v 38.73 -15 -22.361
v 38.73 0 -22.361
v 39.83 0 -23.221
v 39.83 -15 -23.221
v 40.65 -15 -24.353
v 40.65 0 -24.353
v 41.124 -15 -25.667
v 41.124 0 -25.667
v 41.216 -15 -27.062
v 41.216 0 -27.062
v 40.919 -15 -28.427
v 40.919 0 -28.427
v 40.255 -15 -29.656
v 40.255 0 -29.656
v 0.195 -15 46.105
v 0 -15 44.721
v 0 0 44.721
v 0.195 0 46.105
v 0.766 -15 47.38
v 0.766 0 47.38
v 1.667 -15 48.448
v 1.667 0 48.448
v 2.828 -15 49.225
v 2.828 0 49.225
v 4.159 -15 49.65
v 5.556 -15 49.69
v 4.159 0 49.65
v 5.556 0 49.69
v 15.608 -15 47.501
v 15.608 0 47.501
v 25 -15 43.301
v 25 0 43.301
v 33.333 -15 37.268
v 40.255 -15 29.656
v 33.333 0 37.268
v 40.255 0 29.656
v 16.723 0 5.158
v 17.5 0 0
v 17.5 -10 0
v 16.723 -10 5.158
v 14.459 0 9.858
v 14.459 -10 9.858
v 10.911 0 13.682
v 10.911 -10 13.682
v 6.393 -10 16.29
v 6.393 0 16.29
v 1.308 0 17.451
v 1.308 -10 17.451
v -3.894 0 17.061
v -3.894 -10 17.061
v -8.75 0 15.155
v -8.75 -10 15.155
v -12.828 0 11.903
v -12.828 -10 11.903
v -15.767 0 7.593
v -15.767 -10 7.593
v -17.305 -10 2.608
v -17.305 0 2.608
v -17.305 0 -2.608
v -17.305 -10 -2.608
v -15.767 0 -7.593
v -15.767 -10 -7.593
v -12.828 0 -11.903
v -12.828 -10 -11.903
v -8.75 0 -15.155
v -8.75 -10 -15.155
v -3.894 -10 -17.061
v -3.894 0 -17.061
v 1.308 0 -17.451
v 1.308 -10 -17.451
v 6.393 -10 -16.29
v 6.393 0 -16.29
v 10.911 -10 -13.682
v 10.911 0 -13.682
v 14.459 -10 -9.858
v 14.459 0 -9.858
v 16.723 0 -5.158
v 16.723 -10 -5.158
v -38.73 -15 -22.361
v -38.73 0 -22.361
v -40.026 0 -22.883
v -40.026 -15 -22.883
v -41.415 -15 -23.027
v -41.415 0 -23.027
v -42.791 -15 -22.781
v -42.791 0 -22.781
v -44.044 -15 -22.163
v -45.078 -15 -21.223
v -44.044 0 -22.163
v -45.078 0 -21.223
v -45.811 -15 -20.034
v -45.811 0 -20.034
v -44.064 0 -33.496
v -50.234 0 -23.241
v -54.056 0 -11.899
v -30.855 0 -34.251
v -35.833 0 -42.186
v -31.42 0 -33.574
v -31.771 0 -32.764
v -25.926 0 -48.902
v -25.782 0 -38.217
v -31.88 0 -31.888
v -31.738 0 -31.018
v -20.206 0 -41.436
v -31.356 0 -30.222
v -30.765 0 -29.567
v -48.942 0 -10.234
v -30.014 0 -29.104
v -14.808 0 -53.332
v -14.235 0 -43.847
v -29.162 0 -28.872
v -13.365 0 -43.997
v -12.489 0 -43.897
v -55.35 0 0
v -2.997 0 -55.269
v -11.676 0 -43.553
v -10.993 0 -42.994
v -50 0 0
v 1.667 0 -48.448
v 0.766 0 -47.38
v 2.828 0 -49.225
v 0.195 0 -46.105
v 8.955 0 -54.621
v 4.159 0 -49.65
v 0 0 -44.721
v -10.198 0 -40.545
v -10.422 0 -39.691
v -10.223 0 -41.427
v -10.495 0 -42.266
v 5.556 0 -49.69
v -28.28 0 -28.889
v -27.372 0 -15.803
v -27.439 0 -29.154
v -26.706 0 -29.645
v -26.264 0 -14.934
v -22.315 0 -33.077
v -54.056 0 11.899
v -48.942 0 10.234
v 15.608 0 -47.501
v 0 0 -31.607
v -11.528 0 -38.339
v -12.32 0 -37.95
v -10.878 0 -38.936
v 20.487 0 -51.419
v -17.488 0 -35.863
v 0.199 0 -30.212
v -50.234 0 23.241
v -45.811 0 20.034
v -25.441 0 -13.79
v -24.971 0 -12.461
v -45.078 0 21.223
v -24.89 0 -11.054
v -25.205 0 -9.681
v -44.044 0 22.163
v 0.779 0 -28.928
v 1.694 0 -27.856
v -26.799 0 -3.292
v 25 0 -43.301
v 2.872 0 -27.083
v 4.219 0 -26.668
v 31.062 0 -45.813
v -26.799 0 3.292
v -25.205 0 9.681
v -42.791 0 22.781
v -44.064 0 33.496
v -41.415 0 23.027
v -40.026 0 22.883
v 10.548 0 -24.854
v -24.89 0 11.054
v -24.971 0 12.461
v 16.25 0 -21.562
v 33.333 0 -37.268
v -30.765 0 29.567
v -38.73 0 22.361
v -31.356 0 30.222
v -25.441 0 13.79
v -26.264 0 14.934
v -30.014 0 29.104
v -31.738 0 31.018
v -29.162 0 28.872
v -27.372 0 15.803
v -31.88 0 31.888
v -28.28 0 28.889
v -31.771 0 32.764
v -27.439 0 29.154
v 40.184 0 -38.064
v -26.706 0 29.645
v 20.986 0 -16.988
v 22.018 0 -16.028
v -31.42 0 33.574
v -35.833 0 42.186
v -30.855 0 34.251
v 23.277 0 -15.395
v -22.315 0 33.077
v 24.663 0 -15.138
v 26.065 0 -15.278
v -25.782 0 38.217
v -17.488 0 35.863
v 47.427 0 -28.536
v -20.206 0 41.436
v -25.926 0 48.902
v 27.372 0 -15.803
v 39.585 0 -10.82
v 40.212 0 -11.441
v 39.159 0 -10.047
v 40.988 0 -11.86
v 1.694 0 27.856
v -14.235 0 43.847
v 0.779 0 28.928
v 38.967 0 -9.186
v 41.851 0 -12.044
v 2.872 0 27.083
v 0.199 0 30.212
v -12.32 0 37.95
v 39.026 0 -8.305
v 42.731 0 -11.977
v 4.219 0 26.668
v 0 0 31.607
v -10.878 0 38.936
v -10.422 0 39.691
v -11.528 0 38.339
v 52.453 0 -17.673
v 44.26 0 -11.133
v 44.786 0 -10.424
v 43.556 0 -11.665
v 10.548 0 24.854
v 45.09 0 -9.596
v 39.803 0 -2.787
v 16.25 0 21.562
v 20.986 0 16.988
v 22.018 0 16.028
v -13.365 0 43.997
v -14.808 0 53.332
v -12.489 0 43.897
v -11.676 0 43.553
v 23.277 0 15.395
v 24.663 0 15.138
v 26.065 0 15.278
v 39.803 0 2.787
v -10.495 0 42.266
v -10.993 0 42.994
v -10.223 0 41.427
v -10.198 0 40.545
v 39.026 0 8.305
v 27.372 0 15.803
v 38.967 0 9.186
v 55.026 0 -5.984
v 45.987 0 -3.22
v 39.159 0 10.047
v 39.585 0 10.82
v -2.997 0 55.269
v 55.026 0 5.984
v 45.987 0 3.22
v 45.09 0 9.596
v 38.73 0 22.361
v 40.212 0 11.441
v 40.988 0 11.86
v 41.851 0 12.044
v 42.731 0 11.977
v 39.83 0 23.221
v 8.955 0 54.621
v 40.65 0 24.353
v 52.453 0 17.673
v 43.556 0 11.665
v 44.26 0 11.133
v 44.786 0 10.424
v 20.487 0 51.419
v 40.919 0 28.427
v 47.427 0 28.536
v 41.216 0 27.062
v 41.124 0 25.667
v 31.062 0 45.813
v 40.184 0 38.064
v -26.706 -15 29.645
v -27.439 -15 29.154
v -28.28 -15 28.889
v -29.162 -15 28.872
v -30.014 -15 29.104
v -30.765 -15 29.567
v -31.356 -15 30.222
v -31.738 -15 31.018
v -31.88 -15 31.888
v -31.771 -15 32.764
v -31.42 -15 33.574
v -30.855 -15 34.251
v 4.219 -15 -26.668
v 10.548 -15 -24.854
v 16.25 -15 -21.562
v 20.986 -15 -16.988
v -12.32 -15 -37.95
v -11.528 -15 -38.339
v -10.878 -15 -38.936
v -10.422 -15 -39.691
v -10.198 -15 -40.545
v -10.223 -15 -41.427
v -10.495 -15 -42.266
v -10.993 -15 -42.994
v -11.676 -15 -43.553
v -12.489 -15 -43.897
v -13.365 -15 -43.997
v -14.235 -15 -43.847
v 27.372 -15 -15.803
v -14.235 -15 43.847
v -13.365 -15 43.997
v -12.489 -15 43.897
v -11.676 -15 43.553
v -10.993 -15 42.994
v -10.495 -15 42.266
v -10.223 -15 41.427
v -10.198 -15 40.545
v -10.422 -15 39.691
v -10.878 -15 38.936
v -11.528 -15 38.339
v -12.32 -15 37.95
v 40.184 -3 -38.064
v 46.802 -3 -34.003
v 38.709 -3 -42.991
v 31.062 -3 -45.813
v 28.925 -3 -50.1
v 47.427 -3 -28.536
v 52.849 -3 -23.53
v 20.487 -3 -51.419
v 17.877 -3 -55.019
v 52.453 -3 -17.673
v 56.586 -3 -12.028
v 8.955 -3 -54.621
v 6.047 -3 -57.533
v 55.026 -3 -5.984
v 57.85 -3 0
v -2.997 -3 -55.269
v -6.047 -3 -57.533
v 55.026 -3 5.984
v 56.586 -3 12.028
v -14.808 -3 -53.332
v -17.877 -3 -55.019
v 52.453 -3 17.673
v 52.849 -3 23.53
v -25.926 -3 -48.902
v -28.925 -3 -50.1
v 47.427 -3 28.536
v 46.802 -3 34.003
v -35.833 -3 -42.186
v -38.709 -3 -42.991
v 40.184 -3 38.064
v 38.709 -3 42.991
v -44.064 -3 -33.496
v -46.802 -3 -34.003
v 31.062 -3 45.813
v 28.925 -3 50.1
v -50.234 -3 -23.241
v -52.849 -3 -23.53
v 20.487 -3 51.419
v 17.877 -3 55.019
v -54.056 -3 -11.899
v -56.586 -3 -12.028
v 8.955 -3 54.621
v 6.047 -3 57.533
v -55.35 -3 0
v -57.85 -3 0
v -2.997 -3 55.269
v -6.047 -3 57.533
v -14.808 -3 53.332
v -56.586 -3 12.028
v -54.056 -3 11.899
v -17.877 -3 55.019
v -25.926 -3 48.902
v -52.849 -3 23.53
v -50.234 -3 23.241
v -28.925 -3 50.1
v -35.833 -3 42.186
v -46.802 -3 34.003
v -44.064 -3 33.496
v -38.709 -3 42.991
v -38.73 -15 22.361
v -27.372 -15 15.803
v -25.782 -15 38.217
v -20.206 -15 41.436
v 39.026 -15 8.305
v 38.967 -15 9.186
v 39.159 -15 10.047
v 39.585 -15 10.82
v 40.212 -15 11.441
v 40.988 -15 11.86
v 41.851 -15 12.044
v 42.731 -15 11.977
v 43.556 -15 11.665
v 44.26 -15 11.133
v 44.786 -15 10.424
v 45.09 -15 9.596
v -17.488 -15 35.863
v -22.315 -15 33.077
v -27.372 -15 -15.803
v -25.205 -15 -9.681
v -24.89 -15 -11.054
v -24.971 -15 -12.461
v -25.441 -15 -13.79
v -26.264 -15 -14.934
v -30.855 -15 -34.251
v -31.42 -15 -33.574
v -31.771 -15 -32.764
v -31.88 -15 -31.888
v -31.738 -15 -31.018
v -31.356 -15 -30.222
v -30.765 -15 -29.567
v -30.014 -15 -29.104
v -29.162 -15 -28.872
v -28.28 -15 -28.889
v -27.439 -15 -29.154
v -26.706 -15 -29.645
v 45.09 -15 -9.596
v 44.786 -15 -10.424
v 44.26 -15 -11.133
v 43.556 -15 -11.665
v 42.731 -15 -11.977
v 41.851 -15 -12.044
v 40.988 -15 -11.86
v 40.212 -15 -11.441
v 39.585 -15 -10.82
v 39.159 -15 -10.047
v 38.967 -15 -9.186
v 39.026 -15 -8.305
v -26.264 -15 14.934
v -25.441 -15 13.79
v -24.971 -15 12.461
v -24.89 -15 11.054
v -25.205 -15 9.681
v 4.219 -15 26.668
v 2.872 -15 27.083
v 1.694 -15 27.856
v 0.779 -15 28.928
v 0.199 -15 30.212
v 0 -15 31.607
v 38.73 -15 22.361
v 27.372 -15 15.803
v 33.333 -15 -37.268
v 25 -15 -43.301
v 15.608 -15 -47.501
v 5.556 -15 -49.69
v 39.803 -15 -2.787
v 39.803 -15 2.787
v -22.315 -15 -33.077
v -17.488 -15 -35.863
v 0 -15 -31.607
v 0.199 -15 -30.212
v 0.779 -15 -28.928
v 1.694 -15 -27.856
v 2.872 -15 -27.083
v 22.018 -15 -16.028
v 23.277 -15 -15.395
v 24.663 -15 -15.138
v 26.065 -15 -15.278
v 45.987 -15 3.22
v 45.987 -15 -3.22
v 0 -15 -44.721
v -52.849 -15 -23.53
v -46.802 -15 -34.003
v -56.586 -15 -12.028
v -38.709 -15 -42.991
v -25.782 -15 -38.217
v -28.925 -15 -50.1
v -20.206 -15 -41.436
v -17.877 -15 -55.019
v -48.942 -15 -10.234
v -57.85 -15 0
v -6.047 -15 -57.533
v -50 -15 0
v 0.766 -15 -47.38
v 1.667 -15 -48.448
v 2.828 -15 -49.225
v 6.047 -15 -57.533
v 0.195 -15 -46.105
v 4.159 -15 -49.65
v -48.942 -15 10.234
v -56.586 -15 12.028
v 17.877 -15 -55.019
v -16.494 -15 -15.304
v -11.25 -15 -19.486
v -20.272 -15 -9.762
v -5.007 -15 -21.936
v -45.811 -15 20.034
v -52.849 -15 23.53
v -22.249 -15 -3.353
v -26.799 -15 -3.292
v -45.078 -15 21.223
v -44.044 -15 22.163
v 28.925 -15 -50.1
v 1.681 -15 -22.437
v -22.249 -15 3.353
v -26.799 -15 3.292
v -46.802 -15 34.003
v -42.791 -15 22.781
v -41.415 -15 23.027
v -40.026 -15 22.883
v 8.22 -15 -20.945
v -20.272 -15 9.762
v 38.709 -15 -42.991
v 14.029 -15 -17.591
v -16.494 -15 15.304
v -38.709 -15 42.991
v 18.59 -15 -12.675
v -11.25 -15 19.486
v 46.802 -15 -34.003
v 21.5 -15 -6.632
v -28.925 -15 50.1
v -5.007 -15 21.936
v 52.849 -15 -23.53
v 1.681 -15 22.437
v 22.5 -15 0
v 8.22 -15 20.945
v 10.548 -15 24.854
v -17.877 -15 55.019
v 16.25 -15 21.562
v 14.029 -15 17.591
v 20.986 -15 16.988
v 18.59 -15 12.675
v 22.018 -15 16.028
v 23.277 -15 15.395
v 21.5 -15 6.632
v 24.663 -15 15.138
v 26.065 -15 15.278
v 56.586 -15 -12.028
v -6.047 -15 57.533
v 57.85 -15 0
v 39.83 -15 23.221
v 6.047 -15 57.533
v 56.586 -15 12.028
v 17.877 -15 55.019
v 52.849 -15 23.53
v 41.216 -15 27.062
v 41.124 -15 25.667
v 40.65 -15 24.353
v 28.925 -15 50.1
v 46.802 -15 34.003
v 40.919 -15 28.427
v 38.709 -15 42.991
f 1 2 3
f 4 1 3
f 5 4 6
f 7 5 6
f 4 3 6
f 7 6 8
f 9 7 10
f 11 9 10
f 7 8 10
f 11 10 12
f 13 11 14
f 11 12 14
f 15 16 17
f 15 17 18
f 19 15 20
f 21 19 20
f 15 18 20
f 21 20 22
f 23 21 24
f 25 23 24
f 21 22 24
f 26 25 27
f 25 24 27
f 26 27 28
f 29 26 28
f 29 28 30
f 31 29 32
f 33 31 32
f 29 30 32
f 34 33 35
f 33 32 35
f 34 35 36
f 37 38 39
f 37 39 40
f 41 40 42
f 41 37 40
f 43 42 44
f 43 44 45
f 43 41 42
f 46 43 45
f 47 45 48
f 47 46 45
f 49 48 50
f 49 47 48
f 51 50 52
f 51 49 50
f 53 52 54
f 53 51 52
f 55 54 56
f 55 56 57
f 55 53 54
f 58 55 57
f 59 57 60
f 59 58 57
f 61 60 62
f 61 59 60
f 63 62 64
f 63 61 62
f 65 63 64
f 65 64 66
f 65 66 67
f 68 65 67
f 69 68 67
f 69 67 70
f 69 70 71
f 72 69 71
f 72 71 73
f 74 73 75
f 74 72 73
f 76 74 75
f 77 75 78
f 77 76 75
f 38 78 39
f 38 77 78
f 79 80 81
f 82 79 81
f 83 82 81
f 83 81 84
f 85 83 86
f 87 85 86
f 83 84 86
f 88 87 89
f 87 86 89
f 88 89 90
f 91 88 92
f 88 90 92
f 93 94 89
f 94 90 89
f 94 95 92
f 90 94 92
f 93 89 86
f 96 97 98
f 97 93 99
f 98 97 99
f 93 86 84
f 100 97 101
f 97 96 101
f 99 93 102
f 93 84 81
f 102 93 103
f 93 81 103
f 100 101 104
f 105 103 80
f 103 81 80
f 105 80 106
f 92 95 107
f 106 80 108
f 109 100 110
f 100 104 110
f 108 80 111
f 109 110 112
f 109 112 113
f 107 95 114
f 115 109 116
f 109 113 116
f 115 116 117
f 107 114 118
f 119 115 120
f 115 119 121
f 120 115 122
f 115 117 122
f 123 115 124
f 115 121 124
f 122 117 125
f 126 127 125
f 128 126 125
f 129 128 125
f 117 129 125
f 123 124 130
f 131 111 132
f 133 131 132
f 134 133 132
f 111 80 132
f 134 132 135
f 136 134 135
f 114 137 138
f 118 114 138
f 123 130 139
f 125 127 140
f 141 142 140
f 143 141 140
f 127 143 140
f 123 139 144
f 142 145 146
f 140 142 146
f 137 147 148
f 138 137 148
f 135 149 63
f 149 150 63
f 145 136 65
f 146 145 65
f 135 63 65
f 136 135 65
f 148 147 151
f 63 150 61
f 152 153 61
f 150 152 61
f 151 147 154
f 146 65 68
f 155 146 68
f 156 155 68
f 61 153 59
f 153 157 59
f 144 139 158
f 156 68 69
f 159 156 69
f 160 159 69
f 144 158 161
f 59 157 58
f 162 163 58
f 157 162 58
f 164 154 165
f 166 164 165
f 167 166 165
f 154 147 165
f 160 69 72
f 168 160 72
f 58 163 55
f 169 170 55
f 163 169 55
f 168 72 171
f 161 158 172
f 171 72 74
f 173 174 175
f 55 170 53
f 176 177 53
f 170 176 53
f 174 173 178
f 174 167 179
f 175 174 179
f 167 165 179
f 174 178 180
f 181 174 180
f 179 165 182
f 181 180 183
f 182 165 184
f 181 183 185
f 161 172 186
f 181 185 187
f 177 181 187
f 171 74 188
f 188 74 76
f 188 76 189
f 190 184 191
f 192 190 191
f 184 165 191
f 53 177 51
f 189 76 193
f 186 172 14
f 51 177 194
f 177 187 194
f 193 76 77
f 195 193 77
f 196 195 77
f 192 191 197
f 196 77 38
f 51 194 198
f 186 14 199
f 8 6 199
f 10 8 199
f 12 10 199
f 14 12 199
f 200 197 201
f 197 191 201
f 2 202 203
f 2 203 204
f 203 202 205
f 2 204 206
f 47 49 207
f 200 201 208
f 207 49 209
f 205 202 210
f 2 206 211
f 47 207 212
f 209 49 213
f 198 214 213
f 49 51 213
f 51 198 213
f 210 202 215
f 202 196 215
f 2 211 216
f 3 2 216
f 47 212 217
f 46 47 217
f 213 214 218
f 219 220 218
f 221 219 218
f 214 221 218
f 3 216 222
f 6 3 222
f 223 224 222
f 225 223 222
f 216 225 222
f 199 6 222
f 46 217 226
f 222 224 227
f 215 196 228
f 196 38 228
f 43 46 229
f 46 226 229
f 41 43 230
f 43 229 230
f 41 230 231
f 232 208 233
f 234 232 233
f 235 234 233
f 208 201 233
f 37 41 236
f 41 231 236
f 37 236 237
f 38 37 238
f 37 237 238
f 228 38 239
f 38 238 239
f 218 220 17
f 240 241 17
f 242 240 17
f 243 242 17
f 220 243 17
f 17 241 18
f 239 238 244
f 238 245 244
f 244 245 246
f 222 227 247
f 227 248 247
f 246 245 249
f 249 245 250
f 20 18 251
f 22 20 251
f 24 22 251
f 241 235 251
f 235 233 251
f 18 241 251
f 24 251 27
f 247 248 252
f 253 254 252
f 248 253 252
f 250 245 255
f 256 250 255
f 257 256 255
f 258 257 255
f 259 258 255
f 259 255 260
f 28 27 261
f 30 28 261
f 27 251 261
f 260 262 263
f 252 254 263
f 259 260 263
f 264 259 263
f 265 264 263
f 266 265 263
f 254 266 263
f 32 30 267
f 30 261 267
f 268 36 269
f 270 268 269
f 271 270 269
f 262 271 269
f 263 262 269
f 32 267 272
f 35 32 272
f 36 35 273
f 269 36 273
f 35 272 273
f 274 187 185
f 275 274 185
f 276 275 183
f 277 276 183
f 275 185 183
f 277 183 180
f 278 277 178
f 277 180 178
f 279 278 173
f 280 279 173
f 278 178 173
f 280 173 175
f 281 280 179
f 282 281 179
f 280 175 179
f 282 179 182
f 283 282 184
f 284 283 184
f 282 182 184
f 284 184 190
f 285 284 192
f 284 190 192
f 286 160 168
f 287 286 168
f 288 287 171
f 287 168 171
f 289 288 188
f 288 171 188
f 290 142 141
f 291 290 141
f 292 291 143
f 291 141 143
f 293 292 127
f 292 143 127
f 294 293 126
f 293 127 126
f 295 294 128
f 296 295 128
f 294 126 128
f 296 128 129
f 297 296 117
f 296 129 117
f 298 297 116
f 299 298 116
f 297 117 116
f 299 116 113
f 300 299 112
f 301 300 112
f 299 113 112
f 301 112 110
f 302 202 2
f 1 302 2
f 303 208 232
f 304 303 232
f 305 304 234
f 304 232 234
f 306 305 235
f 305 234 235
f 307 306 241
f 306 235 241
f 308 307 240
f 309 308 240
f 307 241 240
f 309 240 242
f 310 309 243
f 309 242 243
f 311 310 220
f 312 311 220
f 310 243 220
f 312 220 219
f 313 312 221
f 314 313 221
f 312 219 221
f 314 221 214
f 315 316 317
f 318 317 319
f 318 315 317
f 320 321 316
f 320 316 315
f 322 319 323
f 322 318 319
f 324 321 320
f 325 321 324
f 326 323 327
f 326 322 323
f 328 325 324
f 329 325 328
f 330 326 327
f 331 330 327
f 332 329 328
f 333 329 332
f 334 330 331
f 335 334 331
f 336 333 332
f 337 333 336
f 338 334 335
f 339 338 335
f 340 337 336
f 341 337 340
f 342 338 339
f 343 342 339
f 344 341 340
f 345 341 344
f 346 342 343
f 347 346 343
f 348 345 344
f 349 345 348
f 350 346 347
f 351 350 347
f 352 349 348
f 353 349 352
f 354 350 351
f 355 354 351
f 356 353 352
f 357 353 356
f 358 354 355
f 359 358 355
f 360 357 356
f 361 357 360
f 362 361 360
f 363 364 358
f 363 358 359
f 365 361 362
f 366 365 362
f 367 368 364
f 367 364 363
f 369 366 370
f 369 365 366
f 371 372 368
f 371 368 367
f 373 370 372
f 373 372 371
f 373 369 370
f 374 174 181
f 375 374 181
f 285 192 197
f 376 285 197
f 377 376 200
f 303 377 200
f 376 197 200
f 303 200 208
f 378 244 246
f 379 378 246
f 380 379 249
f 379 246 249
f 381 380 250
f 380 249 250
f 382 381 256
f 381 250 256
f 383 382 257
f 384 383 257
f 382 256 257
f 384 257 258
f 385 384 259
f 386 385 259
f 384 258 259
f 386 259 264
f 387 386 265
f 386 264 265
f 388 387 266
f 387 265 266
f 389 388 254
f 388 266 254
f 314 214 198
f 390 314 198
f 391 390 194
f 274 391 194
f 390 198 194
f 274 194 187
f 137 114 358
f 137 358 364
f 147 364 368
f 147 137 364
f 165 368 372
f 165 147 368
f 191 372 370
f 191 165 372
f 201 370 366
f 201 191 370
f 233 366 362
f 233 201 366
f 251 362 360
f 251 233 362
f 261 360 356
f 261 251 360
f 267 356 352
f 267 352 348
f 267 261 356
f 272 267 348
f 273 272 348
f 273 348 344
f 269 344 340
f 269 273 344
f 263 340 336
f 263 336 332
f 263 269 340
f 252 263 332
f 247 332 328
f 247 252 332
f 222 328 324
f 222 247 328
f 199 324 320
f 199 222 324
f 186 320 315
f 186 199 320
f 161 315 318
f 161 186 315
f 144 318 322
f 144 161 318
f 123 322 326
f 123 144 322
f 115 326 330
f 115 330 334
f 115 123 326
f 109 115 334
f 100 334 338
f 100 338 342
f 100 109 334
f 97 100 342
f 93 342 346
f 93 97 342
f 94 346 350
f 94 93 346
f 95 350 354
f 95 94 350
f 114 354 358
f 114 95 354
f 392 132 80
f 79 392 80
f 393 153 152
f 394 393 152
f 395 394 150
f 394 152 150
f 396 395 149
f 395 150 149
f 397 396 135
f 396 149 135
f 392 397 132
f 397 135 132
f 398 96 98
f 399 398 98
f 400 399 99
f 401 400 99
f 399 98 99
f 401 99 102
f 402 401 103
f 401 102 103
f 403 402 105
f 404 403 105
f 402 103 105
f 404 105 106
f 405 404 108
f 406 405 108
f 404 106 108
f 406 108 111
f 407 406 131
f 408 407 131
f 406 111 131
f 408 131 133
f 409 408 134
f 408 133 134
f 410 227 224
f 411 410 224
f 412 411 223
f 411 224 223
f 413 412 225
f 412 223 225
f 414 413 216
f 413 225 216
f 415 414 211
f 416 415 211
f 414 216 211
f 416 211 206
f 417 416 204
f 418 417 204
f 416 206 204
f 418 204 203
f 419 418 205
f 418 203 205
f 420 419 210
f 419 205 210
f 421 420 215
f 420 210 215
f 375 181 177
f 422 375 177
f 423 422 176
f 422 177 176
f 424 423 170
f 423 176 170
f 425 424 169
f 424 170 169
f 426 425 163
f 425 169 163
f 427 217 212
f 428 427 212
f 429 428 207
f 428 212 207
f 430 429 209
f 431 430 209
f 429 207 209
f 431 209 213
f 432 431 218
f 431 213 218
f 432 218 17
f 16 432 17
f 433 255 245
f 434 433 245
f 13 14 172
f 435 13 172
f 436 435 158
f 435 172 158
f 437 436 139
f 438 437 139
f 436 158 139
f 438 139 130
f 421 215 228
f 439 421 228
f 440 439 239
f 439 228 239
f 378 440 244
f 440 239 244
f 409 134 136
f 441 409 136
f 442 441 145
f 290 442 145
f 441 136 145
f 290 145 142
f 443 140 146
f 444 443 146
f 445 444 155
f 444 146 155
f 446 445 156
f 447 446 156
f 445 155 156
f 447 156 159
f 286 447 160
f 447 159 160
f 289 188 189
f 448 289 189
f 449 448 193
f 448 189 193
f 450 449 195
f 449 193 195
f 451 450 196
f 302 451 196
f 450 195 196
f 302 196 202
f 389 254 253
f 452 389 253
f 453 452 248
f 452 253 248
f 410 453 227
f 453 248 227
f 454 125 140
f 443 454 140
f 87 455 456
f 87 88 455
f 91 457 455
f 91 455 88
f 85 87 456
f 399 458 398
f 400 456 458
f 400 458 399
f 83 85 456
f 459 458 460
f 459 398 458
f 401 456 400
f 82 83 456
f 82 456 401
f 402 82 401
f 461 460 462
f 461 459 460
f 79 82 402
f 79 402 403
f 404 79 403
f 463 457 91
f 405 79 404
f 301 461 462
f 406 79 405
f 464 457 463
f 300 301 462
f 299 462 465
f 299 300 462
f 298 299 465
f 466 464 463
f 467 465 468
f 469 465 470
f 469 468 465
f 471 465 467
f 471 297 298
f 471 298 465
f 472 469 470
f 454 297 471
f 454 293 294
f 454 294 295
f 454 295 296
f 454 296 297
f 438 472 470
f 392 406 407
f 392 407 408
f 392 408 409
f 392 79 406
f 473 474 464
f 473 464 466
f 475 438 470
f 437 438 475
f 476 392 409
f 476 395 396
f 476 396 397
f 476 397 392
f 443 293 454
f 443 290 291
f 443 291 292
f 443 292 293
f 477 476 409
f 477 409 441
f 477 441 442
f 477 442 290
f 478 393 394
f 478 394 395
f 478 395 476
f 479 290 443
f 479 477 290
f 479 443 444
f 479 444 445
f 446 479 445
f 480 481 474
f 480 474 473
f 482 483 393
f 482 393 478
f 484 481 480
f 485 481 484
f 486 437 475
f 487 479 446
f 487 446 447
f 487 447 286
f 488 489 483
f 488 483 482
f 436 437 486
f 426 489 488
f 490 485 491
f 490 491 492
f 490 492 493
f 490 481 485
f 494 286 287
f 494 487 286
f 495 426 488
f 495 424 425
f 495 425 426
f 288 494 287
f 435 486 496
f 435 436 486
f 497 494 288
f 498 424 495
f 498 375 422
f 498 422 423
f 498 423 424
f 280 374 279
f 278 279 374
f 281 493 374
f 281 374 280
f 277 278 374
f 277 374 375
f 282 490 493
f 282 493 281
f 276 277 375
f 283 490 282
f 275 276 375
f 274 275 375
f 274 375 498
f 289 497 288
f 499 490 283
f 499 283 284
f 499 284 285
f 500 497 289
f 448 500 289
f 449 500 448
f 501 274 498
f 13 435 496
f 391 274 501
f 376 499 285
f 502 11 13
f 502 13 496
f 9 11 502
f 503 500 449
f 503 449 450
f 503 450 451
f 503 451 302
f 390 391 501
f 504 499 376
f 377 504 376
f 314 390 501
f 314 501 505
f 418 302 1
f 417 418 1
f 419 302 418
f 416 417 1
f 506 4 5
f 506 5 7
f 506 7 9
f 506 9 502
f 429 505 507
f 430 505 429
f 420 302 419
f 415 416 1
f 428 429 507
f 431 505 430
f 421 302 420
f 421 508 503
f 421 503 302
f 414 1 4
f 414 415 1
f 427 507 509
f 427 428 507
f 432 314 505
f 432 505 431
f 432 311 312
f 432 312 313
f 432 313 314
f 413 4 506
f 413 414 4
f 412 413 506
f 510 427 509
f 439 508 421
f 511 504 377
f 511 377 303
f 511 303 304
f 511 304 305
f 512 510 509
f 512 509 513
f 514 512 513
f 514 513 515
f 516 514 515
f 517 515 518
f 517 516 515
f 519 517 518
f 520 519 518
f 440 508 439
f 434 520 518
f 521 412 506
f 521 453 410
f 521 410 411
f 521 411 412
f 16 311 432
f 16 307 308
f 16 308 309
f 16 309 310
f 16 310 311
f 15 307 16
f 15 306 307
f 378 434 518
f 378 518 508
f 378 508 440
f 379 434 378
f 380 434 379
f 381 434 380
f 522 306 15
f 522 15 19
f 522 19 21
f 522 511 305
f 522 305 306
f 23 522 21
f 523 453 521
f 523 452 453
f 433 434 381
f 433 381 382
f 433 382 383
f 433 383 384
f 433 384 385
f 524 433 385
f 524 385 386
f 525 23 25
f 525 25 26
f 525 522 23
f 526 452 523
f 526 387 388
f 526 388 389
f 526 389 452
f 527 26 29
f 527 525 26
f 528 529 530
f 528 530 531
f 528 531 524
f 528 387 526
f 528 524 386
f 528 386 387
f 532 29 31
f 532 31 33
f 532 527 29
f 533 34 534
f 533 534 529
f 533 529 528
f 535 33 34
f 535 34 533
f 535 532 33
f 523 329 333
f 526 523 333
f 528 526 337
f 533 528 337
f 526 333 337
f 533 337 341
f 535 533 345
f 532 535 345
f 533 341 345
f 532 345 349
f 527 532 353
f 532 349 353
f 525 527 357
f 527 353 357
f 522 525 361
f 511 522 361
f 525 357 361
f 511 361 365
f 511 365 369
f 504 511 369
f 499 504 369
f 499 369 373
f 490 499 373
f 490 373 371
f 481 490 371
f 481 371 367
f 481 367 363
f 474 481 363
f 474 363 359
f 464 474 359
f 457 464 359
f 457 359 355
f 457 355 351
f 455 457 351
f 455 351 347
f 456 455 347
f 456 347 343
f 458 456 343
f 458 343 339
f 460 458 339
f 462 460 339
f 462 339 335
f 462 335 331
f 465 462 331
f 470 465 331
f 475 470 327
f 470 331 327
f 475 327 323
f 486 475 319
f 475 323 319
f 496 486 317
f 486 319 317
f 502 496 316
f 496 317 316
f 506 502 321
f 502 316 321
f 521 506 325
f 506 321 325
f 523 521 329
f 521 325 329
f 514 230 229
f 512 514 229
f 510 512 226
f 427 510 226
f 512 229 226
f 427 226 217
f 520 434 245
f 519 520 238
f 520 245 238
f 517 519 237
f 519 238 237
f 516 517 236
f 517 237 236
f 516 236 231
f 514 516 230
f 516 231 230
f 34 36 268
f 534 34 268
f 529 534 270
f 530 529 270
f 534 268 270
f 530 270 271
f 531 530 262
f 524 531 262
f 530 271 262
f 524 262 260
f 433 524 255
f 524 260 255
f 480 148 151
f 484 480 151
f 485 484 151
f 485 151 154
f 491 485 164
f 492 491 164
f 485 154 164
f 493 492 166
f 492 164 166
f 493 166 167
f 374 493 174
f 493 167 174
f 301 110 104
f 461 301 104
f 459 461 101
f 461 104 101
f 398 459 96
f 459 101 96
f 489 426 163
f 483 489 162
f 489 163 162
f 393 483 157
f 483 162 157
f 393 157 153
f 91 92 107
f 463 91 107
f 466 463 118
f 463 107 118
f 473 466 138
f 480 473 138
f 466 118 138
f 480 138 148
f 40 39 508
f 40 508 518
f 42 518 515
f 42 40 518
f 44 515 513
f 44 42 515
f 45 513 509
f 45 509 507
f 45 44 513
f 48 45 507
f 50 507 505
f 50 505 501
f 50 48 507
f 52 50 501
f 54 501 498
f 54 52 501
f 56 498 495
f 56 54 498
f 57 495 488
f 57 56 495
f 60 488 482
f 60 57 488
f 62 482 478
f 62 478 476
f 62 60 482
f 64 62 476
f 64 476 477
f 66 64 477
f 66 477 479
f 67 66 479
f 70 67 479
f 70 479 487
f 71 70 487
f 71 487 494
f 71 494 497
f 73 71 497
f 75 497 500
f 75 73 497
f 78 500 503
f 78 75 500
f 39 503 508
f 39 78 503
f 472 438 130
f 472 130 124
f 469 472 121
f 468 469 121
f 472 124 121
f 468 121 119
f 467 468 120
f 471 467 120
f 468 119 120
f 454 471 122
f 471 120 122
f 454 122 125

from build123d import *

# Parameters (mm, degrees)
F0_R     = 57.85
F0_R_2   = 17.5
F1_DEPTH = 15
F2_R     = 57.85
F2_R_2   = 55.35
F3_DEPTH = 3
F4_SIZE  = 5


with BuildPart() as f1:
    # F0 (on Front) → F1 (new body)
    with BuildSketch(Plane.XZ):
        Circle(F0_R)
        with BuildLine():
            ThreePointArc((-12.320414, -37.950196), (-10.329128, -41.855933), (-14.234864, -43.847219))
            ThreePointArc((-14.234864, -43.847219), (-23.05, -39.923771), (-30.855373, -34.251364))
            ThreePointArc((-30.855373, -34.251364), (-31.083737, -29.873254), (-26.705627, -29.64489))
            ThreePointArc((-26.705627, -29.64489), (-19.95, -34.554414), (-12.320414, -37.950196))
        make_face(mode=Mode.SUBTRACT)
        with BuildLine():
            ThreePointArc((-27.372431, 15.803481), (-25.159068, 13.141948), (-25.204864, 9.680642))
            ThreePointArc((-25.204864, 9.680642), (-27, 0), (-25.204864, -9.680642))
            ThreePointArc((-25.204864, -9.680642), (-25.159068, -13.141948), (-27.372431, -15.803481))
            Line((-27.372431, -15.803481), (-38.729833, -22.36068))
            ThreePointArc((-38.729833, -22.36068), (-42.790653, -22.780694), (-45.810926, -20.033948))
            ThreePointArc((-45.810926, -20.033948), (-50, 0), (-45.810926, 20.033948))
            ThreePointArc((-45.810926, 20.033948), (-42.790653, 22.780694), (-38.729833, 22.36068))
            Line((-38.729833, 22.36068), (-27.372431, 15.803481))
        make_face(mode=Mode.SUBTRACT)
        Circle(F0_R_2, mode=Mode.SUBTRACT)
        with BuildLine():
            Line((0, -44.72136), (0, -31.606961))
            ThreePointArc((0, -31.606961), (1.198273, -28.359366), (4.21875, -26.668374))
            ThreePointArc((4.21875, -26.668374), (13.5, -23.382686), (20.986114, -16.987731))
            ThreePointArc((20.986114, -16.987731), (23.960795, -15.217418), (27.372431, -15.803481))
            Line((27.372431, -15.803481), (38.729833, -22.36068))
            ThreePointArc((38.729833, -22.36068), (41.123986, -25.667445), (40.255371, -29.656452))
            ThreePointArc((40.255371, -29.656452), (25, -43.30127), (5.555556, -49.690399))
            ThreePointArc((5.555556, -49.690399), (1.666667, -48.44814), (0, -44.72136))
        make_face(mode=Mode.SUBTRACT)
        with BuildLine():
            ThreePointArc((45.090238, 9.595855), (46.1, 0), (45.090238, -9.595855))
            ThreePointArc((45.090238, -9.595855), (41.412865, -11.982679), (39.026041, -8.305306))
            ThreePointArc((39.026041, -8.305306), (39.9, 0), (39.026041, 8.305306))
            ThreePointArc((39.026041, 8.305306), (41.412865, 11.982679), (45.090238, 9.595855))
        make_face(mode=Mode.SUBTRACT)
        with BuildLine():
            ThreePointArc((-30.855373, 34.251364), (-23.05, 39.923771), (-14.234864, 43.847219))
            ThreePointArc((-14.234864, 43.847219), (-10.329128, 41.855933), (-12.320414, 37.950196))
            ThreePointArc((-12.320414, 37.950196), (-19.95, 34.554414), (-26.705627, 29.64489))
            ThreePointArc((-26.705627, 29.64489), (-31.083737, 29.873254), (-30.855373, 34.251364))
        make_face(mode=Mode.SUBTRACT)
        with BuildLine():
            ThreePointArc((20.986114, 16.987731), (13.5, 23.382686), (4.21875, 26.668374))
            ThreePointArc((4.21875, 26.668374), (1.198273, 28.359366), (0, 31.606961))
            Line((0, 31.606961), (0, 44.72136))
            ThreePointArc((0, 44.72136), (1.666667, 48.44814), (5.555556, 49.690399))
            ThreePointArc((5.555556, 49.690399), (25, 43.30127), (40.255371, 29.656452))
            ThreePointArc((40.255371, 29.656452), (41.123986, 25.667445), (38.729833, 22.36068))
            Line((38.729833, 22.36068), (27.372431, 15.803481))
            ThreePointArc((27.372431, 15.803481), (23.960795, 15.217418), (20.986114, 16.987731))
        make_face(mode=Mode.SUBTRACT)
    extrude(amount=F1_DEPTH)

    # F2 (on face) → F3 (cut)
    with BuildSketch(Plane(origin=(0, 0, 0), x_dir=(-1, 0, 0), z_dir=(0, 1, 0))):
        Circle(F2_R)
        Circle(F2_R_2, mode=Mode.SUBTRACT)
    extrude(amount=-F3_DEPTH, mode=Mode.SUBTRACT)

    # F4
    f4_edges = [f1.edges().sort_by_distance(p)[0] for p in [
        (-17.5, -15, 0),
    ]]
    chamfer(f4_edges, length=F4_SIZE)


solid = f1.part
